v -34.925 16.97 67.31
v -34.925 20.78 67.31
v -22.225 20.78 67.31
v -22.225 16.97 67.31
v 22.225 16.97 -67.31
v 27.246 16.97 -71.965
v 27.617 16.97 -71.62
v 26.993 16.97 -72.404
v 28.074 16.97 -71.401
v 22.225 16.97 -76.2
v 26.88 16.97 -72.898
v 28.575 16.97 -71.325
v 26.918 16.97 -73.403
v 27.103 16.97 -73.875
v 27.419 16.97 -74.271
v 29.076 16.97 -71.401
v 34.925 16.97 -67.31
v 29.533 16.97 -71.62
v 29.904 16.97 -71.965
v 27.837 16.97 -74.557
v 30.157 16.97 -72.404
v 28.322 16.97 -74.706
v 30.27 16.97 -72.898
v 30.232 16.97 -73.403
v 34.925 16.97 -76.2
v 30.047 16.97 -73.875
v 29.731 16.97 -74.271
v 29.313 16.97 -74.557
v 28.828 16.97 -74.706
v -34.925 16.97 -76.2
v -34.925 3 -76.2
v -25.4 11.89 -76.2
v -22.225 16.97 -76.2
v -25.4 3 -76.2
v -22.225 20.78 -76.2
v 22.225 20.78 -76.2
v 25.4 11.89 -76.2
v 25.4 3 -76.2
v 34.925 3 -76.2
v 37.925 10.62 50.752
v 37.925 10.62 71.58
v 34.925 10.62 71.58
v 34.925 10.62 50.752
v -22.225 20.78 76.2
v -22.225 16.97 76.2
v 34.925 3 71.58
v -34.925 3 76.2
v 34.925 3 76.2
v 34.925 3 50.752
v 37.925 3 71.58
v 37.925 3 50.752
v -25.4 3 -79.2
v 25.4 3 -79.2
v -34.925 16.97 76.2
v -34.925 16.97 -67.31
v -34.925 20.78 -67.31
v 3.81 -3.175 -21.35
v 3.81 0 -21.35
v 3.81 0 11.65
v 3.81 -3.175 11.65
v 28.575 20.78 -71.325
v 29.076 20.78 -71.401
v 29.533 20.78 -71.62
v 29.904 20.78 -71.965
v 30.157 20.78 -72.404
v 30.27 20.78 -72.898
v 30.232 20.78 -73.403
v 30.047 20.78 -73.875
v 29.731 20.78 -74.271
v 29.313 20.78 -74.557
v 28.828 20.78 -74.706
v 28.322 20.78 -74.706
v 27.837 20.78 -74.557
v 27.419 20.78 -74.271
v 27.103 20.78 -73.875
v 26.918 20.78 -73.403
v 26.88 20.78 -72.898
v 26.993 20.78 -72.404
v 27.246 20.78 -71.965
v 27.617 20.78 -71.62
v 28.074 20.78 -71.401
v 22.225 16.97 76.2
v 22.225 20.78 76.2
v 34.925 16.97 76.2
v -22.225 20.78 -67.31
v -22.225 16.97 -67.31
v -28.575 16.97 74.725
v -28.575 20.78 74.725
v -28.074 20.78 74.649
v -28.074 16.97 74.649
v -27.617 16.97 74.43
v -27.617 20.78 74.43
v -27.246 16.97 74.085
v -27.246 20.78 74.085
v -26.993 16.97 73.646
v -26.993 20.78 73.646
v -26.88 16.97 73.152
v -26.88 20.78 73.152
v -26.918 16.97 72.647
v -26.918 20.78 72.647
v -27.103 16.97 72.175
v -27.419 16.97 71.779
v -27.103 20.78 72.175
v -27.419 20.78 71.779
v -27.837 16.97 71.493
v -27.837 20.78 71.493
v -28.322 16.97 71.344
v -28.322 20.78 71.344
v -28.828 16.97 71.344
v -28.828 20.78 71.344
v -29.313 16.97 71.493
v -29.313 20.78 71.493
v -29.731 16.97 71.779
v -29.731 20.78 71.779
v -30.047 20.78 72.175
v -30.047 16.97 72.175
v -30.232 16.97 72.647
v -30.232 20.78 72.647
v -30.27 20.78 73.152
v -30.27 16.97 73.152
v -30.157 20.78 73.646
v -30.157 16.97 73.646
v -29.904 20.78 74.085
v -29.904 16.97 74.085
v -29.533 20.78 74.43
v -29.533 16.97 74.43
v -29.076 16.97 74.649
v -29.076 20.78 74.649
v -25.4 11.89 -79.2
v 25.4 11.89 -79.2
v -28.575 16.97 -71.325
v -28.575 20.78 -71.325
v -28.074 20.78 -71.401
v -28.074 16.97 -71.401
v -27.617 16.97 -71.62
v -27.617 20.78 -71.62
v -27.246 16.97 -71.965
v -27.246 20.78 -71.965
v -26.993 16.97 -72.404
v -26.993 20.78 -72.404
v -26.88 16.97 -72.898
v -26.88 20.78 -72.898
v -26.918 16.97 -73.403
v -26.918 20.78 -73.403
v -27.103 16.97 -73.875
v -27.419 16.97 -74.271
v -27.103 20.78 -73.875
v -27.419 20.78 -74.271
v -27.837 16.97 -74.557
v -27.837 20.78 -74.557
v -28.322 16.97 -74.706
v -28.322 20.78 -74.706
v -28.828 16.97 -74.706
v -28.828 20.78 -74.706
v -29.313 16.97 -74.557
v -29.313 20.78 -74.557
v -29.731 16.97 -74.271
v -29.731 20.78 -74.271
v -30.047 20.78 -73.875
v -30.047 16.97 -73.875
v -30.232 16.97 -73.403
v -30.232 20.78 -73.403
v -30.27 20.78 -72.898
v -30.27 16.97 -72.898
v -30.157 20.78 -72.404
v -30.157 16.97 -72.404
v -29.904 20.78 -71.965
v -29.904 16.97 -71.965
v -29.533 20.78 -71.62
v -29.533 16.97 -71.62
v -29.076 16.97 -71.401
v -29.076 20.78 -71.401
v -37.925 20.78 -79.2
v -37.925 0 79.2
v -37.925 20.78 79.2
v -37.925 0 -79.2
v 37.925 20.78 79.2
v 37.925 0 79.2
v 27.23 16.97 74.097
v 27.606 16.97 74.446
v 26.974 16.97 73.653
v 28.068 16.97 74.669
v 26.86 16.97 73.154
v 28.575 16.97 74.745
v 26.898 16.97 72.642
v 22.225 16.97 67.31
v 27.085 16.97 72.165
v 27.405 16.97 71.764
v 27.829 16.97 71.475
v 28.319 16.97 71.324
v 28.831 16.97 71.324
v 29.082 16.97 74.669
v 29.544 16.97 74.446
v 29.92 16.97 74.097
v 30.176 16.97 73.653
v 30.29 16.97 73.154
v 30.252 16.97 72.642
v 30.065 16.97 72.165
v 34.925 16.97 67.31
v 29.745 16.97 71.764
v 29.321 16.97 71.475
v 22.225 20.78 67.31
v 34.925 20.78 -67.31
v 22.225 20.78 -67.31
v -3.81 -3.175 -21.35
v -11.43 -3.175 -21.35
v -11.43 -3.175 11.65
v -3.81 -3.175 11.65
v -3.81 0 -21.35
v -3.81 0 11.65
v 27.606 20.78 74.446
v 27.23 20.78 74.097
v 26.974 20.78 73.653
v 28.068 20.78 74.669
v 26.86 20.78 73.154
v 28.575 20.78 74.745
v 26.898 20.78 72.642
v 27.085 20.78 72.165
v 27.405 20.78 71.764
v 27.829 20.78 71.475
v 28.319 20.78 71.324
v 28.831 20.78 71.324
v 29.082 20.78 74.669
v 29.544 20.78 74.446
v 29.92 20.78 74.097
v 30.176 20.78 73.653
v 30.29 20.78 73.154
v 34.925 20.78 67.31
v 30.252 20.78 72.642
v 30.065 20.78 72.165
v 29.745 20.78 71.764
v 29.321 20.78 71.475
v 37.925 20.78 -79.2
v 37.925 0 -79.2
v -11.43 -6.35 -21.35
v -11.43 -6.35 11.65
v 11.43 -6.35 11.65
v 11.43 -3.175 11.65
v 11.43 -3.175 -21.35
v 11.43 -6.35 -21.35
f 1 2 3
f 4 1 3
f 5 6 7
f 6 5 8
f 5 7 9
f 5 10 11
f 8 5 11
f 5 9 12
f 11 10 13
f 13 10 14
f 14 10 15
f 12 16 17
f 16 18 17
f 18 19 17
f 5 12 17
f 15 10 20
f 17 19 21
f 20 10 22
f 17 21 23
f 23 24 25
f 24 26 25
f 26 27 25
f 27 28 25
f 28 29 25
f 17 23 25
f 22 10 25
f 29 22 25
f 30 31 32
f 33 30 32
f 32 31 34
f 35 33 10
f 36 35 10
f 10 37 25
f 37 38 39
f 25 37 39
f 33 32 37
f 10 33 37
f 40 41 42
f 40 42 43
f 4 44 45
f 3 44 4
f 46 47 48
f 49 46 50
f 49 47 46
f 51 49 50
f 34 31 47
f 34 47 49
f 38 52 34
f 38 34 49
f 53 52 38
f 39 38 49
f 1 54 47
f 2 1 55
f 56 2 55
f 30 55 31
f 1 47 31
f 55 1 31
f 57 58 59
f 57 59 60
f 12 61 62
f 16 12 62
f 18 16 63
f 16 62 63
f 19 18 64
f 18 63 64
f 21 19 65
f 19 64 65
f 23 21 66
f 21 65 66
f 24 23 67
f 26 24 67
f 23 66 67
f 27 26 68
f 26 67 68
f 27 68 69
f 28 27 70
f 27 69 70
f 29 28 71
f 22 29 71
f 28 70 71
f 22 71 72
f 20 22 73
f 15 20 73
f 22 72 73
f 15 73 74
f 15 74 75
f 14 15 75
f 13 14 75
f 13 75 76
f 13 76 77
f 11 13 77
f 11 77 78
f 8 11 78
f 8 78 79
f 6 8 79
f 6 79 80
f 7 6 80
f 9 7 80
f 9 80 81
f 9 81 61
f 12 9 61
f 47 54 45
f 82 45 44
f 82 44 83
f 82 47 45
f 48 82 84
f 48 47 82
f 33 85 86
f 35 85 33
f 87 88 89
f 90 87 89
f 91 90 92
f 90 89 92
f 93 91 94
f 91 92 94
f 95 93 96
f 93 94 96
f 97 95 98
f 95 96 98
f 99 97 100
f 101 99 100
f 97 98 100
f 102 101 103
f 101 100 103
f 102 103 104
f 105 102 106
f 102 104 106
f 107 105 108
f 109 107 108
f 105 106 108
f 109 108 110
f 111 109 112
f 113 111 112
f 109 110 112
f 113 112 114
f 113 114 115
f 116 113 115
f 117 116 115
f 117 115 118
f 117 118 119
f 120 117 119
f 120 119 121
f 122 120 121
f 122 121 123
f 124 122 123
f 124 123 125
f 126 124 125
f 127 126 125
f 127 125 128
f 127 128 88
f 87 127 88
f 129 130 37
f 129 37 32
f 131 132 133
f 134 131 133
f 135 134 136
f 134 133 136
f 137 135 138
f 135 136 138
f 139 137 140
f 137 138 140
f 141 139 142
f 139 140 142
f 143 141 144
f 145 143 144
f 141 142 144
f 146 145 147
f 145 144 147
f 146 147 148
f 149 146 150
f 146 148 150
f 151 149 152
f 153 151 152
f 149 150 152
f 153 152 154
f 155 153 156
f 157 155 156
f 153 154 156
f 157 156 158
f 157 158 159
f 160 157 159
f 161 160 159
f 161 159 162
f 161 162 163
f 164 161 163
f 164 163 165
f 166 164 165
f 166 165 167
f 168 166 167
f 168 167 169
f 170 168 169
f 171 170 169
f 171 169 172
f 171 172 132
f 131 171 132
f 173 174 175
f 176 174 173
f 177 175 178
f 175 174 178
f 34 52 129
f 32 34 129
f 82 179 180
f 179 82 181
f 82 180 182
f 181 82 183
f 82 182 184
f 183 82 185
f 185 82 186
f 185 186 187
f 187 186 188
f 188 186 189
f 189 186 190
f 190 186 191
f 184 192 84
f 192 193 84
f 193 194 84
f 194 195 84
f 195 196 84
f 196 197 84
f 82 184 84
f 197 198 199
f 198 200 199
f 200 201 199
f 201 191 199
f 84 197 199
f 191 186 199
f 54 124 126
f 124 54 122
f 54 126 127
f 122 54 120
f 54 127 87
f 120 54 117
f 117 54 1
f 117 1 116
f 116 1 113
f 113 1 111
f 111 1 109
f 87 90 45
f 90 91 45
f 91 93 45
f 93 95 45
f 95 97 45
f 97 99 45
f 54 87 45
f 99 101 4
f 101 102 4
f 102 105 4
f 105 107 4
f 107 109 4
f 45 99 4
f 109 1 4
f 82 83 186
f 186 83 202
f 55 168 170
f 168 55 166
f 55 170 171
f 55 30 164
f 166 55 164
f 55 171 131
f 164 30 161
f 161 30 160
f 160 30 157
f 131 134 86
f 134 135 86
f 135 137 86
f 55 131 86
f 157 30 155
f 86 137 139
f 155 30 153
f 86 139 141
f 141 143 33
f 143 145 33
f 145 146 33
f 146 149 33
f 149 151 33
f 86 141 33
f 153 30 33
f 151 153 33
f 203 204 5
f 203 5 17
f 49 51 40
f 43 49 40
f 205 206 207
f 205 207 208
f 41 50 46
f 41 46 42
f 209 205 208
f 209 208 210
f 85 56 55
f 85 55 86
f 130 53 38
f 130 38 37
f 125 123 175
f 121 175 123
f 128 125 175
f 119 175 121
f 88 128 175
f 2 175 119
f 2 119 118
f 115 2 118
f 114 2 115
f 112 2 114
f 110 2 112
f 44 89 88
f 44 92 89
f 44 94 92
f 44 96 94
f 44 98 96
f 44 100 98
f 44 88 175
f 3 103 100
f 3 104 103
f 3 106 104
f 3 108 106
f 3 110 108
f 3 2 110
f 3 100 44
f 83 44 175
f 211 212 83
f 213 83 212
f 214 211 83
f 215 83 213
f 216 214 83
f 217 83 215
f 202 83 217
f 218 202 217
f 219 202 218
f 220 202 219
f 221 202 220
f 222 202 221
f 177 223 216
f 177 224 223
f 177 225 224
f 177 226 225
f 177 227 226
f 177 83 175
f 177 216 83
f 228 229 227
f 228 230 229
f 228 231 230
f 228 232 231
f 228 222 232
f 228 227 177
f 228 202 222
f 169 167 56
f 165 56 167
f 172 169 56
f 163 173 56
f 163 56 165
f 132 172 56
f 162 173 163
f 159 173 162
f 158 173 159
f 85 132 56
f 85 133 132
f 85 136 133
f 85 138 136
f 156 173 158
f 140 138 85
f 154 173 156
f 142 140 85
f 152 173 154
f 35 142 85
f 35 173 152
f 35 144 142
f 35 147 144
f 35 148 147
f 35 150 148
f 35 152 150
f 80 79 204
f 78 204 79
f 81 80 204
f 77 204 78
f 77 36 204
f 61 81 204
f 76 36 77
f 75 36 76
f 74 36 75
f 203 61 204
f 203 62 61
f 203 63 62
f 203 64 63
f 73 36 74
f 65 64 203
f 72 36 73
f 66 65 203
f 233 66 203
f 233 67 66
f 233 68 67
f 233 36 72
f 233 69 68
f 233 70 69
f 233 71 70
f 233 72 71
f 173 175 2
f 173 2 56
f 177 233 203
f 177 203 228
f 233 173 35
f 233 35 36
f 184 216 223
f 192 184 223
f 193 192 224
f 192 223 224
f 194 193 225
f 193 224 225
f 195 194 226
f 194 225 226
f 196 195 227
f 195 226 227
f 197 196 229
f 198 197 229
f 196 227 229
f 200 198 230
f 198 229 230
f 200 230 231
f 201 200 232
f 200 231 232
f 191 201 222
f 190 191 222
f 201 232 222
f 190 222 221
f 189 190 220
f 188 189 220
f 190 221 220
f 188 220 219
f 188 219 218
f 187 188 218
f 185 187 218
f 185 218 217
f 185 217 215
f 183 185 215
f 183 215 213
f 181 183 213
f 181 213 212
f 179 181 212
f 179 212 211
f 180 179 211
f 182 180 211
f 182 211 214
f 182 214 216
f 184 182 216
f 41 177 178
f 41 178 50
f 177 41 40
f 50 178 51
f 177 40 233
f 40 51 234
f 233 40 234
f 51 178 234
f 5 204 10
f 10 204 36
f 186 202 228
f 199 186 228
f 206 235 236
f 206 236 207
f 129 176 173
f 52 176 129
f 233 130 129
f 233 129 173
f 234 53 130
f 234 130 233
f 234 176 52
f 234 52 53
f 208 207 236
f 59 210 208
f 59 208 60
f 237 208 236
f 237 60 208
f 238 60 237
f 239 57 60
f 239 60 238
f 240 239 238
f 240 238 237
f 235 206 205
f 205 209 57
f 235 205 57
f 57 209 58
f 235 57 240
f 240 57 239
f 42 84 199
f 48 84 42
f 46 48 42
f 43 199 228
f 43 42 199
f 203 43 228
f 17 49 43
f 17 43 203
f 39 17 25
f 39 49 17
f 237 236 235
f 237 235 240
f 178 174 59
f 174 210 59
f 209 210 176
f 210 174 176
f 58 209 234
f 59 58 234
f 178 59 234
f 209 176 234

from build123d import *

# Parameters (mm, degrees)
SKETCH1_W               = 75.85
SKETCH1_H               = 158.4
BOSS_EXTRUDE1_DEPTH     = 3
SKETCH2_W               = 75.85
SKETCH2_H               = 158.4
SKETCH2_W_2             = 69.85
SKETCH2_H_2             = 152.4
BOSS_EXTRUDE2_DEPTH     = 17.78
SKETCH3_W               = 12.7
SKETCH3_H               = 8.89
BOSS_EXTRUDE3_DEPTH     = 3.81
SKETCH7_W               = 50.8
SKETCH7_H               = 42.7
BOSS_EXTRUDE4_DEPTH     = 6.35
CUT_EXTRUDE2_DEPTH      = 110.455089078
CUT_EXTRUDE2_DEPTH_BACK = 110.455089078
CUT_EXTRUDE3_START      = -6.35
SKETCH9_W               = 22.86
SKETCH9_H               = 9.7
CUT_EXTRUDE3_DEPTH      = 6.35
CUT_EXTRUDE4_REACH      = 93.907
SKETCH4_R               = 1.7
SKETCH4_R_2             = 1.72
CUT_EXTRUDE5_REACH      = 166.197
SKETCH10_W              = 50.8
SKETCH10_H              = 8.89
CUT_EXTRUDE6_REACH      = 113.614
SKETCH11_W              = 20.828
SKETCH11_H              = 7.62


with BuildPart() as part:
    # Sketch1 → Boss-Extrude1 (new body)
    with BuildSketch(Plane(origin=(0, 0, 0), x_dir=(1, 0, 0), z_dir=(0, 1, 0))):
        Rectangle(SKETCH1_W, SKETCH1_H)
    extrude(amount=BOSS_EXTRUDE1_DEPTH)

    # Sketch2 → Boss-Extrude2 (add)
    with BuildSketch(Plane(origin=(0, 3, 0), x_dir=(1, 0, 0), z_dir=(0, 1, 0))):
        Rectangle(SKETCH2_W, SKETCH2_H)
        Rectangle(SKETCH2_W_2, SKETCH2_H_2, mode=Mode.SUBTRACT)
    extrude(amount=BOSS_EXTRUDE2_DEPTH)

    # Sketch3 → Boss-Extrude3 (add)
    with BuildSketch(Plane(origin=(0, 20.78, 0), x_dir=(1, 0, 0), z_dir=(0, 1, 0))):
        with Locations((-28.575, 71.755)):
            Rectangle(SKETCH3_W, SKETCH3_H)
        with Locations((-28.575, -71.755)):
            Rectangle(SKETCH3_W, SKETCH3_H)
        with Locations((28.575, 71.755)):
            Rectangle(SKETCH3_W, SKETCH3_H)
        with Locations((28.575, -71.755)):
            Rectangle(SKETCH3_W, SKETCH3_H)
    extrude(amount=-BOSS_EXTRUDE3_DEPTH)

    # Sketch7 → Boss-Extrude4 (add)
    with BuildSketch(Plane.XZ):
        Rectangle(SKETCH7_W, SKETCH7_H)
    extrude(amount=BOSS_EXTRUDE4_DEPTH)

    # Sketch8 → Cut-Extrude2 (cut, two sides: drawn at the far end of the back side and taken through both)
    with BuildSketch(Plane.XY.offset(21.35).offset(-CUT_EXTRUDE2_DEPTH_BACK)):
        Polygon((-3.81, -3.175), (-3.81, 0), (-25.4, 0), (-25.4, -6.35), (-11.43, -6.35), (-11.43, -3.175), align=None)
        Polygon((25.4, 0), (3.81, 0), (3.81, -3.175), (11.43, -3.175), (11.43, -6.35), (25.4, -6.35), align=None)
    extrude(amount=CUT_EXTRUDE2_DEPTH + CUT_EXTRUDE2_DEPTH_BACK, mode=Mode.SUBTRACT)

    # Sketch9 → Cut-Extrude3 (cut)
    with BuildSketch(Plane.XZ.offset(6.35).offset(CUT_EXTRUDE3_START)):
        with Locations((0, 16.5)):
            Rectangle(SKETCH9_W, SKETCH9_H)
    extrude(amount=CUT_EXTRUDE3_DEPTH, mode=Mode.SUBTRACT)

    # Sketch4 → Cut-Extrude4 (cut, up to next)
    with BuildSketch(Plane(origin=(0, 20.78, 0), x_dir=(1, 0, 0), z_dir=(0, 1, 0)), mode=Mode.PRIVATE) as cut_extrude4_sk1:
        with Locations(Location((-28.575, 73.025, 0), (0, 0, 270))):
            Circle(SKETCH4_R)
    cut_extrude4_tool1 = extrude(cut_extrude4_sk1.sketch, amount=-CUT_EXTRUDE4_REACH, mode=Mode.PRIVATE) & part.part
    # Sketch4 → Cut-Extrude4 (cut, up to next)
    with BuildSketch(Plane(origin=(0, 20.78, 0), x_dir=(1, 0, 0), z_dir=(0, 1, 0)), mode=Mode.PRIVATE) as cut_extrude4_sk2:
        with Locations(Location((28.575, 73.025, 0), (0, 0, 270))):
            Circle(SKETCH4_R)
    cut_extrude4_tool2 = extrude(cut_extrude4_sk2.sketch, amount=-CUT_EXTRUDE4_REACH, mode=Mode.PRIVATE) & part.part
    # Sketch4 → Cut-Extrude4 (cut, up to next)
    with BuildSketch(Plane(origin=(0, 20.78, 0), x_dir=(1, 0, 0), z_dir=(0, 1, 0)), mode=Mode.PRIVATE) as cut_extrude4_sk3:
        with Locations(Location((28.575, -73.025, 0), (0, 0, 270))):
            Circle(SKETCH4_R_2)
    cut_extrude4_tool3 = extrude(cut_extrude4_sk3.sketch, amount=-CUT_EXTRUDE4_REACH, mode=Mode.PRIVATE) & part.part
    # Sketch4 → Cut-Extrude4 (cut, up to next)
    with BuildSketch(Plane(origin=(0, 20.78, 0), x_dir=(1, 0, 0), z_dir=(0, 1, 0)), mode=Mode.PRIVATE) as cut_extrude4_sk4:
        with Locations(Location((-28.575, -73.025, 0), (0, 0, 270))):
            Circle(SKETCH4_R)
    cut_extrude4_tool4 = extrude(cut_extrude4_sk4.sketch, amount=-CUT_EXTRUDE4_REACH, mode=Mode.PRIVATE) & part.part
    add(cut_extrude4_tool1.solids().sort_by_distance((-28.575, 20.78, -73.025))[0], mode=Mode.SUBTRACT)
    add(cut_extrude4_tool2.solids().sort_by_distance((28.575, 20.78, -73.025))[0], mode=Mode.SUBTRACT)
    add(cut_extrude4_tool3.solids().sort_by_distance((28.575, 20.78, 73.025))[0], mode=Mode.SUBTRACT)
    add(cut_extrude4_tool4.solids().sort_by_distance((-28.575, 20.78, 73.025))[0], mode=Mode.SUBTRACT)

    # Sketch10 → Cut-Extrude5 (cut, up to next)
    with BuildSketch(Plane(origin=(0, 0, -79.2), x_dir=(-1, 0, 0), z_dir=(0, 0, -1)), mode=Mode.PRIVATE) as cut_extrude5_sk1:
        with Locations((0, 7.445)):
            Rectangle(SKETCH10_W, SKETCH10_H)
    cut_extrude5_tool1 = extrude(cut_extrude5_sk1.sketch, amount=-CUT_EXTRUDE5_REACH, mode=Mode.PRIVATE) & part.part
    add(cut_extrude5_tool1.solids().sort_by_distance((0, 7.445, -79.2))[0], mode=Mode.SUBTRACT)

    # Sketch11 → Cut-Extrude6 (cut, up to next)
    with BuildSketch(Plane(origin=(37.925, 0, 0), x_dir=(0, 0, -1), z_dir=(1, 0, 0)), mode=Mode.PRIVATE) as cut_extrude6_sk1:
        with Locations((-61.166, 6.81)):
            Rectangle(SKETCH11_W, SKETCH11_H)
    cut_extrude6_tool1 = extrude(cut_extrude6_sk1.sketch, amount=-CUT_EXTRUDE6_REACH, mode=Mode.PRIVATE) & part.part
    add(cut_extrude6_tool1.solids().sort_by_distance((37.925, 6.81, 61.166))[0], mode=Mode.SUBTRACT)


solid = part.part
